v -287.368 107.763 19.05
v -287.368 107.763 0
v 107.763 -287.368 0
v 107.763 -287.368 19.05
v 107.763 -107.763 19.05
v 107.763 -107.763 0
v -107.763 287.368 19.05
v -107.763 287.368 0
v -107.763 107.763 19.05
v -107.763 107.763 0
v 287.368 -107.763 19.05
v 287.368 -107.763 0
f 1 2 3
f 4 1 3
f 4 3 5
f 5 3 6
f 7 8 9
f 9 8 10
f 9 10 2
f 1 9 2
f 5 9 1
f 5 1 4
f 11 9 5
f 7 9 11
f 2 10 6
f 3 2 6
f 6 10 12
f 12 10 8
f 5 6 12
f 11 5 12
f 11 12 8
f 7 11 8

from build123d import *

# Parameters (mm, degrees)
F1_DEPTH = 19.05
F2_DEPTH = 19.05


with BuildPart() as f1:
    # F0 (on Top) → F1 (new body)
    with BuildSketch(Plane.XY):
        Polygon((-107.763073, 107.763073), (-287.368196, 107.763073), (107.763073, -287.368196), (107.763073, -107.763073), align=None)
    extrude(amount=F1_DEPTH)

    # F0 (on Top) → F2 (join)
    with BuildSketch(Plane.XY):
        Polygon((-107.763073, 287.368196), (-107.763073, 107.763073), (107.763073, -107.763073), (287.368196, -107.763073), align=None)
    extrude(amount=F2_DEPTH)


solid = f1.part
